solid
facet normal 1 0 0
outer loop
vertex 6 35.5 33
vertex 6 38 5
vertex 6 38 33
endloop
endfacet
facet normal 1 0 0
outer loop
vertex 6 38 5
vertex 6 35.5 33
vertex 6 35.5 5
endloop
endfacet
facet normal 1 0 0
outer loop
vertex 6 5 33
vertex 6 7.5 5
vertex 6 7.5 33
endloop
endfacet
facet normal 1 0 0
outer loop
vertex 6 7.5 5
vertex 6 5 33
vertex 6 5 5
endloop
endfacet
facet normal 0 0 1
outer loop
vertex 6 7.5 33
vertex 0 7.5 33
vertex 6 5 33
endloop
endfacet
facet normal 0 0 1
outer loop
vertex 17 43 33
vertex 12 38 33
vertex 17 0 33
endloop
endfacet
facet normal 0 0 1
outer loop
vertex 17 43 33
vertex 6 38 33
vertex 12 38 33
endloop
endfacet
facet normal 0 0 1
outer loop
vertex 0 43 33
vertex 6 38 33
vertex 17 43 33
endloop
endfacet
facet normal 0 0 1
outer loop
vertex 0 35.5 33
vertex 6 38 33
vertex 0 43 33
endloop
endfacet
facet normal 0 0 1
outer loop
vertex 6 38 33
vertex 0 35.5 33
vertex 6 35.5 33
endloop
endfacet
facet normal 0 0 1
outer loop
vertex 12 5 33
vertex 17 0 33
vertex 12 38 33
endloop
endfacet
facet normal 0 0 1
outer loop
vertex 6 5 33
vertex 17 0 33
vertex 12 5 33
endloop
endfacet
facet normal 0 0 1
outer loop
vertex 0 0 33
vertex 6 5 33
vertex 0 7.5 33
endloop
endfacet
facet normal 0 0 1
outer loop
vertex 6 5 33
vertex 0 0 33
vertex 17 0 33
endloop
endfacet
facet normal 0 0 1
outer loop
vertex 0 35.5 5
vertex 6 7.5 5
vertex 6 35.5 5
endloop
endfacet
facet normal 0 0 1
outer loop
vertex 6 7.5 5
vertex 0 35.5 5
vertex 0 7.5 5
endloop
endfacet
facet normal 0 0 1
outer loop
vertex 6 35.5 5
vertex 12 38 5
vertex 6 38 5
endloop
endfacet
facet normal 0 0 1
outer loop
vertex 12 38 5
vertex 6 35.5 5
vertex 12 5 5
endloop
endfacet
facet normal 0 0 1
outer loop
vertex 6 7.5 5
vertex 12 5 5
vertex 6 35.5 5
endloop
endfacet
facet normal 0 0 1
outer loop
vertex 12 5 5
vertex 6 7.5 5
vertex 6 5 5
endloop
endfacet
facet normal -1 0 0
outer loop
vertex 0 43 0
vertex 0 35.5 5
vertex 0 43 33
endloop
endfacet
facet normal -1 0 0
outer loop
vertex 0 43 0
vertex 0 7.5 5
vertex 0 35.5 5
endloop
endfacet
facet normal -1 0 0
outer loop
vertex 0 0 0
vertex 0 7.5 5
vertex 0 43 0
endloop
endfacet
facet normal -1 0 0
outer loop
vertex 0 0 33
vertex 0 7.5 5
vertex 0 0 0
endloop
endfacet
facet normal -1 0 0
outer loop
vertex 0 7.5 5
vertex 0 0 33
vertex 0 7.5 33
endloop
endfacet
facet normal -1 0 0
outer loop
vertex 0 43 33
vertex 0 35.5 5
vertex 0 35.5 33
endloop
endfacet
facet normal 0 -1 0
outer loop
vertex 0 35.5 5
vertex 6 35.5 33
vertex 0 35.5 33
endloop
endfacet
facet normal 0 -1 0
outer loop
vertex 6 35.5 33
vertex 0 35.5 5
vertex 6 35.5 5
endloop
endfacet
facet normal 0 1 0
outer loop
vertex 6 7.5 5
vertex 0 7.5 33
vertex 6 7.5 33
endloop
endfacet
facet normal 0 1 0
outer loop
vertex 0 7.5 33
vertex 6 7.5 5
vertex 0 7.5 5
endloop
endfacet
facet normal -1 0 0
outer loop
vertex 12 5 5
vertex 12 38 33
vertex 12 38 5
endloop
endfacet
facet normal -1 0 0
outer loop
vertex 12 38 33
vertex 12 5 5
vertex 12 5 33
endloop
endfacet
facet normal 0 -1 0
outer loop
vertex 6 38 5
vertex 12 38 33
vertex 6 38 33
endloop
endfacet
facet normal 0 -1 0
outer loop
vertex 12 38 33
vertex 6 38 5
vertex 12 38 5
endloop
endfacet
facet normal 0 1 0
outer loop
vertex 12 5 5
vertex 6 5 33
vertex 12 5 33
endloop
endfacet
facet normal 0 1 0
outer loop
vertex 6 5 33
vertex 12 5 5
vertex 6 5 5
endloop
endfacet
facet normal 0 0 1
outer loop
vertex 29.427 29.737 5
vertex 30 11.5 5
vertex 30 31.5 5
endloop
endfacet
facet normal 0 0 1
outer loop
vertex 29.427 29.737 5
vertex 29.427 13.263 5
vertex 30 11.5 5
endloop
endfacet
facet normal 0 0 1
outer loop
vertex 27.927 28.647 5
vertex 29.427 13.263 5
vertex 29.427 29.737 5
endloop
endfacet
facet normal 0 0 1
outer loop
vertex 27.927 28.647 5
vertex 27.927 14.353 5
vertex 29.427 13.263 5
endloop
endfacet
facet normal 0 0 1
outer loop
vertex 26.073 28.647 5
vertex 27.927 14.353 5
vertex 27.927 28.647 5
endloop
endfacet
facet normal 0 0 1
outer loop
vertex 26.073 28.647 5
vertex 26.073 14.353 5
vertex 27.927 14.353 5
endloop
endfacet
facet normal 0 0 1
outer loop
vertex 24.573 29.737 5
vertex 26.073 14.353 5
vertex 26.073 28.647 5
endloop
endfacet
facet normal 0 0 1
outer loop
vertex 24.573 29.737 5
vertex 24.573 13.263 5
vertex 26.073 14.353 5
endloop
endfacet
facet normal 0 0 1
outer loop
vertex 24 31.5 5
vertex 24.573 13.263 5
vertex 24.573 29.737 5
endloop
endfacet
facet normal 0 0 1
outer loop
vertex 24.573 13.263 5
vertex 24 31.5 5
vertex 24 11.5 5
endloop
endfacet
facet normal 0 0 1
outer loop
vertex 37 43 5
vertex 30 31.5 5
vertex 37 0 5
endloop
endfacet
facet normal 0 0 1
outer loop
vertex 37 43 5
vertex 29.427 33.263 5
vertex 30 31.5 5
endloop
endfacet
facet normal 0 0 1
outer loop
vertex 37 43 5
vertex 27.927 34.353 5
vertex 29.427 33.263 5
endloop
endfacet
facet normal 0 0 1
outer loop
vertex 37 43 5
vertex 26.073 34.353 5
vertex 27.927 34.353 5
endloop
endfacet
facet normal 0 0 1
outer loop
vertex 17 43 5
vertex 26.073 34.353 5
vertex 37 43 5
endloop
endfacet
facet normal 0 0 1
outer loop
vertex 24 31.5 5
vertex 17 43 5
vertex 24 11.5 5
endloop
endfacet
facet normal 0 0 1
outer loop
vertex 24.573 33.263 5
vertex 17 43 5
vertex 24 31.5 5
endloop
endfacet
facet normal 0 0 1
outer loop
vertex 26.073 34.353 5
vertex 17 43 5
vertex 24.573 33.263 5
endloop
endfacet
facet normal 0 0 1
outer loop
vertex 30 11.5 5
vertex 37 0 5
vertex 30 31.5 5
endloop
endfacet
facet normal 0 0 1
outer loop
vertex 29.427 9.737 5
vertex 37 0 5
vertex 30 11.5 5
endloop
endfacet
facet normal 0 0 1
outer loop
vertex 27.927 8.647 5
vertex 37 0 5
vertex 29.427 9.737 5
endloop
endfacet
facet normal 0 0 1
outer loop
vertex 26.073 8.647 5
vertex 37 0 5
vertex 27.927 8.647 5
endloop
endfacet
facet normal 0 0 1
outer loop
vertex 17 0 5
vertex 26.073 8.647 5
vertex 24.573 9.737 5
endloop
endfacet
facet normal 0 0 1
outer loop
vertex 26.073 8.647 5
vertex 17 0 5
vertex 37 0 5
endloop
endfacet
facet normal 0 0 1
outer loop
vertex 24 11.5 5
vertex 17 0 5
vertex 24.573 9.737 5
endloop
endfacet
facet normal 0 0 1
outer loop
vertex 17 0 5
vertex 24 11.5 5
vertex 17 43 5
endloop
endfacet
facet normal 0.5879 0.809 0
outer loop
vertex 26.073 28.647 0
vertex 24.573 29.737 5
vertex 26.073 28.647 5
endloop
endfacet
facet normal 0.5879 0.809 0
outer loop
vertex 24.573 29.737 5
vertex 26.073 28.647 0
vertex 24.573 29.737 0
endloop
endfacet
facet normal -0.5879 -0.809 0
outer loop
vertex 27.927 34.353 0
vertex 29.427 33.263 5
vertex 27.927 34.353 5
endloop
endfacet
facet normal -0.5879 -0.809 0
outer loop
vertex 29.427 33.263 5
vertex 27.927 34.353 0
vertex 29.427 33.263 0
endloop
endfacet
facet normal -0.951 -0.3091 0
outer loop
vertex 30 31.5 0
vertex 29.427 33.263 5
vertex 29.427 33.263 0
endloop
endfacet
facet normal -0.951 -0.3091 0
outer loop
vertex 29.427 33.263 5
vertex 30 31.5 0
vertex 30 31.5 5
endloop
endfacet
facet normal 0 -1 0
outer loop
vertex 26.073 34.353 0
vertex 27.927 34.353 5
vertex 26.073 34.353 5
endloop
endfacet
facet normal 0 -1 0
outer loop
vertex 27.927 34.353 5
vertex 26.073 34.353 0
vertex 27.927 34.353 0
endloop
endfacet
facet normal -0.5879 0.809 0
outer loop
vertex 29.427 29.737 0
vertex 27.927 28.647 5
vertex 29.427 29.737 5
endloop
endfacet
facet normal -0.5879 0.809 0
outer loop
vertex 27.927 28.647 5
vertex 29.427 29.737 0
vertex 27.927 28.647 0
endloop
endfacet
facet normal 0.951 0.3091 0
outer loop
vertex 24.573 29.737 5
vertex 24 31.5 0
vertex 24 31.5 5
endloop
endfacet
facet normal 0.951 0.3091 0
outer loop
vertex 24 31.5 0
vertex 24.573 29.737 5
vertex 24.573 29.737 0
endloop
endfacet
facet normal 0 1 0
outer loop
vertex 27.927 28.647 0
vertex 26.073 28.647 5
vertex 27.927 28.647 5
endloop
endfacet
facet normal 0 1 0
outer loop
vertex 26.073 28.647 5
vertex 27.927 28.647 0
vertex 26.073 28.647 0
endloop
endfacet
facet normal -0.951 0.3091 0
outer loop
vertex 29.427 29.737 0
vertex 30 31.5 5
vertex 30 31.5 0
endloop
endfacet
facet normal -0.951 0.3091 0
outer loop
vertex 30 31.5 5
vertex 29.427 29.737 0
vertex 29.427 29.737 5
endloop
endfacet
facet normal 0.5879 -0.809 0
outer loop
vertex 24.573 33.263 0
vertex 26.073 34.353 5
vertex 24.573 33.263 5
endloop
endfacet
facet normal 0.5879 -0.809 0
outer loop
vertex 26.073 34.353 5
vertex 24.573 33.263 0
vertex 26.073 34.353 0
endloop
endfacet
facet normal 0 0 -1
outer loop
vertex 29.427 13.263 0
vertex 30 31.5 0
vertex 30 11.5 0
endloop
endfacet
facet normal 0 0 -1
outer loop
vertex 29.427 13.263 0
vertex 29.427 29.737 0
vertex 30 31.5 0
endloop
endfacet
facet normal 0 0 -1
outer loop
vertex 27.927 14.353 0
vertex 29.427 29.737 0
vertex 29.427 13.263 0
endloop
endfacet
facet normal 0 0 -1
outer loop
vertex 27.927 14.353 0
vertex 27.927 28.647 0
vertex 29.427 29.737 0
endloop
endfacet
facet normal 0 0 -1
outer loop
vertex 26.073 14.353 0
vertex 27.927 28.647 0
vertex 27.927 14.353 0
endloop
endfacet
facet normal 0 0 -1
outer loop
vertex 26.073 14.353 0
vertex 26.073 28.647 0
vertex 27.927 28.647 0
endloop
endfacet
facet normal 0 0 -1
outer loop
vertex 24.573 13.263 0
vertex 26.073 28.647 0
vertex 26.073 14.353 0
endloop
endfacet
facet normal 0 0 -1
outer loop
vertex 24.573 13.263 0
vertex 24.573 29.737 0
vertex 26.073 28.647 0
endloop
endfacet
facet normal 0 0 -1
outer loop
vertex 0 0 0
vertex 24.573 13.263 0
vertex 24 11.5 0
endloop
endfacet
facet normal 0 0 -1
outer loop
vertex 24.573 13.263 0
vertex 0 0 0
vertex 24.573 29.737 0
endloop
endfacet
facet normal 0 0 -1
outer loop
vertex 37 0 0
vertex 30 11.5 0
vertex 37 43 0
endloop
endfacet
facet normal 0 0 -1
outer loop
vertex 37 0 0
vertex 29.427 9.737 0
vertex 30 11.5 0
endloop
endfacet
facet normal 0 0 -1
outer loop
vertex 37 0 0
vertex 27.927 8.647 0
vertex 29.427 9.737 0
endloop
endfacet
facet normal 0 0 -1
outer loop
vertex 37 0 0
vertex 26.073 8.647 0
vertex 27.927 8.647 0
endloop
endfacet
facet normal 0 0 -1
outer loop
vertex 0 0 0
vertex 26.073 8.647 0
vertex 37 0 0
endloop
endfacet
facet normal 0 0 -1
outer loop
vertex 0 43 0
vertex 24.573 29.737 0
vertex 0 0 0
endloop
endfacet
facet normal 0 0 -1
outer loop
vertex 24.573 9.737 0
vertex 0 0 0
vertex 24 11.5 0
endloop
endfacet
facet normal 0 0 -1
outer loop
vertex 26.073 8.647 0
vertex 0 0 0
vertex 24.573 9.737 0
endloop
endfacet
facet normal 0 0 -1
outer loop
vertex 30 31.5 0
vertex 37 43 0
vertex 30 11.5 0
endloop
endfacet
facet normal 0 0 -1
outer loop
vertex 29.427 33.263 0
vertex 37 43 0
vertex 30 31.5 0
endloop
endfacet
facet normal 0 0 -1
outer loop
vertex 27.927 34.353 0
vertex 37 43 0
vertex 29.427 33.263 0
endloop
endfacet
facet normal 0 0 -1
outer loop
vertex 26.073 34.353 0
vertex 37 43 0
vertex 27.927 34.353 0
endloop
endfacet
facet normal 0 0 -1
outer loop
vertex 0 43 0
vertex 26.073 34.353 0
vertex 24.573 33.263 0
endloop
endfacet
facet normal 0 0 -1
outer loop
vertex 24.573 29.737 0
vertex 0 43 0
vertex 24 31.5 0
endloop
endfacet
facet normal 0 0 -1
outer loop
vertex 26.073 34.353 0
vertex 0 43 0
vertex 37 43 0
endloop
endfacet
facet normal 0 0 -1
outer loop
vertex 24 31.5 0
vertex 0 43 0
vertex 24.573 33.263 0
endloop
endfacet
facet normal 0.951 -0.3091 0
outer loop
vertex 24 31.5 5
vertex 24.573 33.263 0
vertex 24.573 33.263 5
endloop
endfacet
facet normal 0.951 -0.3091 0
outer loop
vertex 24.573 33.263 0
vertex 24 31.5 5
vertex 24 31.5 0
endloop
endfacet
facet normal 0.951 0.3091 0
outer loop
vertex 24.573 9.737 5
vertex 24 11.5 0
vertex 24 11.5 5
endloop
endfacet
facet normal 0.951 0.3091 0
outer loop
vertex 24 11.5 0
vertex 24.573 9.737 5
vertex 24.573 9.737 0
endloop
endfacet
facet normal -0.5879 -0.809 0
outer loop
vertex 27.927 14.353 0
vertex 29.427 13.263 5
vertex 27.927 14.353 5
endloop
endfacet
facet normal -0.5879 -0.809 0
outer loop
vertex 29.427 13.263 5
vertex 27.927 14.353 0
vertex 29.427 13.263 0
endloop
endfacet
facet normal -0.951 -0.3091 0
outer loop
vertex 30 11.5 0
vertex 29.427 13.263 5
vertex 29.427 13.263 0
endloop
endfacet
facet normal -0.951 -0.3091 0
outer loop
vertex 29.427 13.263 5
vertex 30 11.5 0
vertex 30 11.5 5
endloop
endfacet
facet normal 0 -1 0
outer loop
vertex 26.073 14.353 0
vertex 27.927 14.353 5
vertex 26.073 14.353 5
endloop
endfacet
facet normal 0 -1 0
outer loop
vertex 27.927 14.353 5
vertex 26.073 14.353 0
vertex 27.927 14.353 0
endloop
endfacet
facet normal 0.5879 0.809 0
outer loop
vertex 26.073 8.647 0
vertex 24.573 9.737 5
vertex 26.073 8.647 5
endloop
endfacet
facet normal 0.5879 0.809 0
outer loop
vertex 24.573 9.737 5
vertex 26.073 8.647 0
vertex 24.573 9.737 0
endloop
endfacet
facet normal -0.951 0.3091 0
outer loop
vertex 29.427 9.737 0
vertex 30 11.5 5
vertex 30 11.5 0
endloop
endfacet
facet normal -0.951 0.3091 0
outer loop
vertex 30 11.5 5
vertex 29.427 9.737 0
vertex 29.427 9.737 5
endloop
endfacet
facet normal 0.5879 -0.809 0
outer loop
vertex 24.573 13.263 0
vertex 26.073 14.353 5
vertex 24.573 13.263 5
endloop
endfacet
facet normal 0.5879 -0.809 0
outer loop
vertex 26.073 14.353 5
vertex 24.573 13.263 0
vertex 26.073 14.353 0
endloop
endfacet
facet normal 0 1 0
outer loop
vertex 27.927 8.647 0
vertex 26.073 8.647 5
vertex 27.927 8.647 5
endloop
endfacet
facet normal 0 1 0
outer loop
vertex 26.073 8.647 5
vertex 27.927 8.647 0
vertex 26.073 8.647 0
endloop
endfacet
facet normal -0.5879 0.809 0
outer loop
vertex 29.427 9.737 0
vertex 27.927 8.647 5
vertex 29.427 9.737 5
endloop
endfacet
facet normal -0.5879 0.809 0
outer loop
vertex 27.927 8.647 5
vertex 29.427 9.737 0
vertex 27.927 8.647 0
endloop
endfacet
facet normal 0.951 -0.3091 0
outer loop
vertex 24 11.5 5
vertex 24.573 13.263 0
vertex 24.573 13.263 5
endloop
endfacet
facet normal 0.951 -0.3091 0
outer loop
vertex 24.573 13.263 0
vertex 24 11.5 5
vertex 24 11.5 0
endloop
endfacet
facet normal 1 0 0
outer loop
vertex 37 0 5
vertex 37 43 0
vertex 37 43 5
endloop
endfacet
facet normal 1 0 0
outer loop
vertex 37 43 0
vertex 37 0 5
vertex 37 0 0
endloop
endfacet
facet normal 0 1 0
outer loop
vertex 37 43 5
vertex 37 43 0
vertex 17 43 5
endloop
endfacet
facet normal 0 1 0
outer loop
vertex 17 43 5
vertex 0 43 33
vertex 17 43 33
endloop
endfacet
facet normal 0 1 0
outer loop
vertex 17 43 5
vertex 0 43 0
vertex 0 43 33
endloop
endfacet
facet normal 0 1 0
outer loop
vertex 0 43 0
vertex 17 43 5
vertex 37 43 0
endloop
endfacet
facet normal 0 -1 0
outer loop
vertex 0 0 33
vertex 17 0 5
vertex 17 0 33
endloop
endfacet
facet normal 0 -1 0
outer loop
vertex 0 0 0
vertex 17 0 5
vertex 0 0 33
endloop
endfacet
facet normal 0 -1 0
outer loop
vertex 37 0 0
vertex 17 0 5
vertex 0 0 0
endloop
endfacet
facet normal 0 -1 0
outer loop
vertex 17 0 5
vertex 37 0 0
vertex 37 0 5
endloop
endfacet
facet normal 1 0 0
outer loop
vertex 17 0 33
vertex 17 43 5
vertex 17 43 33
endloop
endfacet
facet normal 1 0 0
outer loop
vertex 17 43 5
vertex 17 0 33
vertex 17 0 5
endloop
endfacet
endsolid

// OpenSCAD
/* -*- mode: c; fill-column: 80; -*- */
// Mounting bracket for camera
// Nick Pascucci
// December, 2011

camera_mount();

module camera_mount(){
  // Customization parameters
  slot_width = 33; // Width of the top of the T slot
  slot_base = 28; // Width of the base of the slot
  slot_thickness = 6; // Height of the slot's two portions in the X
  bracket_depth = 20; // Depth of the bracket slot
  bracket_height = 33; // Height of the entire bracket
  bracket_width = 43; // Width of the bracket in the Y
  bracket_thickness = 5; // Thickness of the bracket interface
  hole_size = 3; // Size of the screw holes
  hole_separation = 20; // Separation of the two holes

  // Precomputed variables
  bracket_length = (2 * slot_thickness + bracket_thickness + bracket_depth);

  difference(){
    cube([bracket_length, bracket_width, bracket_height]);
    translate([0, (bracket_width - slot_base)/2, bracket_thickness]){
      t_slot(slot_base, slot_width, slot_thickness, bracket_height - bracket_thickness);
    }
    translate([2 * slot_thickness + bracket_thickness, 0, bracket_thickness]){
      cube([bracket_depth, bracket_width, (bracket_height - bracket_thickness)]);
    }
    translate([bracket_length - (bracket_depth / 2), bracket_width / 2, bracket_thickness]){
      holes(hole_size, hole_separation, bracket_thickness);
    }
  }
}

module t_slot(slot_base, slot_width, slot_thickness, bracket_height){
  cube([slot_thickness, slot_base, bracket_height]);
  translate([slot_thickness, -(slot_width - slot_base)/2, 0]){
    cube([slot_thickness, slot_width, bracket_height]);
  }
}

module holes(hole_size, hole_separation, bracket_thickness){
  translate([0, hole_separation/2, -bracket_thickness]){
    cylinder(h = bracket_thickness, r = hole_size);
  }
  translate([0, -hole_separation/2, -bracket_thickness]){
    cylinder(h = bracket_thickness, r = hole_size);
  }
}
